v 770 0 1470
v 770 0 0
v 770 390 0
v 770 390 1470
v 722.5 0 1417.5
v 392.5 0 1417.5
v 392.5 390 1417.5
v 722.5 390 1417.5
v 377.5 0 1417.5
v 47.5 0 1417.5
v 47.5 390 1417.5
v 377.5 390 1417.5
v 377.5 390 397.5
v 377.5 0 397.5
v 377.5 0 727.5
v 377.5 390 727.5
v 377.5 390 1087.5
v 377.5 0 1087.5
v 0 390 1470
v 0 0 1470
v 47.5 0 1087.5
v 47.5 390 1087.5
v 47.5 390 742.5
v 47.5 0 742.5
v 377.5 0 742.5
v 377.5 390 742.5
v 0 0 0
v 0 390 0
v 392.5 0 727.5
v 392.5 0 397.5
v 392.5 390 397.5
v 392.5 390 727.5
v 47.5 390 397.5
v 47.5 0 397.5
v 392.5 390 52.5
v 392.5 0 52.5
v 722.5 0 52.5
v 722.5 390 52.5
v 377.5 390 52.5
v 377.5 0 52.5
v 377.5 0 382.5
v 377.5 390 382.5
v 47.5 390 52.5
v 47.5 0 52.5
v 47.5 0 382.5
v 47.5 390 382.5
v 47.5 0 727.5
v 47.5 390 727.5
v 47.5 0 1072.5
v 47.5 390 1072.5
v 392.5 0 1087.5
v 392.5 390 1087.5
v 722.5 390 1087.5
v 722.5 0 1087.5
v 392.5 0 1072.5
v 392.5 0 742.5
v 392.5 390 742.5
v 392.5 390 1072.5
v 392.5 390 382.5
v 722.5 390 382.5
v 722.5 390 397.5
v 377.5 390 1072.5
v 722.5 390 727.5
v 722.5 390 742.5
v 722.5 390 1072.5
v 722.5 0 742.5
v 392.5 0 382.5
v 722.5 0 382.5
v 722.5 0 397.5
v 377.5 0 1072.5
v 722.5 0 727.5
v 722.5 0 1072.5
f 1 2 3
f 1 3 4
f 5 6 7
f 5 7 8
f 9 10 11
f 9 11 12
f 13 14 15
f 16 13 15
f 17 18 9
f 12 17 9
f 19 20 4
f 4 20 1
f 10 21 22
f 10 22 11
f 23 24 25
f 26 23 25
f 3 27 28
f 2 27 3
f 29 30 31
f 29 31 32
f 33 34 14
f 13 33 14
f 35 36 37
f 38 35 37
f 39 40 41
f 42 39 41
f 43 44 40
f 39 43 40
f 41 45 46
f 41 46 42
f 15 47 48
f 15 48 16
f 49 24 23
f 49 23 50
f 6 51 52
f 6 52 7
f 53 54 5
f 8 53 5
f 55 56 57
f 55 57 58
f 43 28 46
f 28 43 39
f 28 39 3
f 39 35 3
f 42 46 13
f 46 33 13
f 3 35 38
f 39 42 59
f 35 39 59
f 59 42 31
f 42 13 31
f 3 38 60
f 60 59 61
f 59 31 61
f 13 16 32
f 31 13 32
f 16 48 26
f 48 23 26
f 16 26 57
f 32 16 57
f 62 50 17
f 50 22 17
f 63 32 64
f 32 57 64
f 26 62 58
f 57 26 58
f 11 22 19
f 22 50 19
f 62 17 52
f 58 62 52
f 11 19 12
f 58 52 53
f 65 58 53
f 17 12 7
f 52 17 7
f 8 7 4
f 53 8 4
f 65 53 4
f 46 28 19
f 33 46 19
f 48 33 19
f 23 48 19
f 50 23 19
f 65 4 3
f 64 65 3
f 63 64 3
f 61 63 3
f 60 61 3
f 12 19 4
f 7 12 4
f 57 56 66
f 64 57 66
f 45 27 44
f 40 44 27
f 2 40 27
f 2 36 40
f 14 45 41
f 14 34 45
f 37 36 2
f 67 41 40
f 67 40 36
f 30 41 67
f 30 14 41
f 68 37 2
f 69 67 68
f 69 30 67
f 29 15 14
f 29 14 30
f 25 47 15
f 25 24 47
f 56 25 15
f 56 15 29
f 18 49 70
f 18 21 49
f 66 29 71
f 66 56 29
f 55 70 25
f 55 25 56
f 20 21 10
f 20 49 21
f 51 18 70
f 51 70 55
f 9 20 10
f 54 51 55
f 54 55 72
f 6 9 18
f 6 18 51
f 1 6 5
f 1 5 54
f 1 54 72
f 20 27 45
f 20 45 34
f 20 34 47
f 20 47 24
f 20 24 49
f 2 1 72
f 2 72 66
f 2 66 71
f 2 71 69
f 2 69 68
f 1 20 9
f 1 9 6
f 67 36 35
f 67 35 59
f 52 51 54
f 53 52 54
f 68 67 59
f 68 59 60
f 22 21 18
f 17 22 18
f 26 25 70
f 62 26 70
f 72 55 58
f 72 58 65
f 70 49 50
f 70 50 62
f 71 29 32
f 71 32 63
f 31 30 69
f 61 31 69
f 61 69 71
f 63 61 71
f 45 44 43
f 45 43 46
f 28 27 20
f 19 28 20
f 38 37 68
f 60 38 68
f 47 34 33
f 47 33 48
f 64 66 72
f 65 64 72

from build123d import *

# Parameters (mm, degrees)
F0_W     = 770
F0_H     = 1470
F1_DEPTH = 390
F2_W     = 330
F2_H     = 330
F3_DEPTH = 390


with BuildPart() as f1:
    # F0 (on Front) → F1 (new body)
    with BuildSketch(Plane.XZ):
        with Locations((385, 735)):
            Rectangle(F0_W, F0_H)
    extrude(amount=-F1_DEPTH)

    # F2 (on face) → F3 (cut, through all)
    with BuildSketch(Plane.XZ):
        with Locations((212.5, 562.5)):
            Rectangle(F2_W, F2_H)
        with Locations((557.5, 562.5)):
            Rectangle(F2_W, F2_H)
        with Locations((557.5, 907.5)):
            Rectangle(F2_W, F2_H)
        with Locations((212.5, 907.5)):
            Rectangle(F2_W, F2_H)
        with Locations((212.5, 1252.5)):
            Rectangle(F2_W, F2_H)
        with Locations((557.5, 1252.5)):
            Rectangle(F2_W, F2_H)
        with Locations((212.5, 217.5)):
            Rectangle(F2_W, F2_H)
        with Locations((557.5, 217.5)):
            Rectangle(F2_W, F2_H)
    extrude(amount=-F3_DEPTH, mode=Mode.SUBTRACT)


solid = f1.part
